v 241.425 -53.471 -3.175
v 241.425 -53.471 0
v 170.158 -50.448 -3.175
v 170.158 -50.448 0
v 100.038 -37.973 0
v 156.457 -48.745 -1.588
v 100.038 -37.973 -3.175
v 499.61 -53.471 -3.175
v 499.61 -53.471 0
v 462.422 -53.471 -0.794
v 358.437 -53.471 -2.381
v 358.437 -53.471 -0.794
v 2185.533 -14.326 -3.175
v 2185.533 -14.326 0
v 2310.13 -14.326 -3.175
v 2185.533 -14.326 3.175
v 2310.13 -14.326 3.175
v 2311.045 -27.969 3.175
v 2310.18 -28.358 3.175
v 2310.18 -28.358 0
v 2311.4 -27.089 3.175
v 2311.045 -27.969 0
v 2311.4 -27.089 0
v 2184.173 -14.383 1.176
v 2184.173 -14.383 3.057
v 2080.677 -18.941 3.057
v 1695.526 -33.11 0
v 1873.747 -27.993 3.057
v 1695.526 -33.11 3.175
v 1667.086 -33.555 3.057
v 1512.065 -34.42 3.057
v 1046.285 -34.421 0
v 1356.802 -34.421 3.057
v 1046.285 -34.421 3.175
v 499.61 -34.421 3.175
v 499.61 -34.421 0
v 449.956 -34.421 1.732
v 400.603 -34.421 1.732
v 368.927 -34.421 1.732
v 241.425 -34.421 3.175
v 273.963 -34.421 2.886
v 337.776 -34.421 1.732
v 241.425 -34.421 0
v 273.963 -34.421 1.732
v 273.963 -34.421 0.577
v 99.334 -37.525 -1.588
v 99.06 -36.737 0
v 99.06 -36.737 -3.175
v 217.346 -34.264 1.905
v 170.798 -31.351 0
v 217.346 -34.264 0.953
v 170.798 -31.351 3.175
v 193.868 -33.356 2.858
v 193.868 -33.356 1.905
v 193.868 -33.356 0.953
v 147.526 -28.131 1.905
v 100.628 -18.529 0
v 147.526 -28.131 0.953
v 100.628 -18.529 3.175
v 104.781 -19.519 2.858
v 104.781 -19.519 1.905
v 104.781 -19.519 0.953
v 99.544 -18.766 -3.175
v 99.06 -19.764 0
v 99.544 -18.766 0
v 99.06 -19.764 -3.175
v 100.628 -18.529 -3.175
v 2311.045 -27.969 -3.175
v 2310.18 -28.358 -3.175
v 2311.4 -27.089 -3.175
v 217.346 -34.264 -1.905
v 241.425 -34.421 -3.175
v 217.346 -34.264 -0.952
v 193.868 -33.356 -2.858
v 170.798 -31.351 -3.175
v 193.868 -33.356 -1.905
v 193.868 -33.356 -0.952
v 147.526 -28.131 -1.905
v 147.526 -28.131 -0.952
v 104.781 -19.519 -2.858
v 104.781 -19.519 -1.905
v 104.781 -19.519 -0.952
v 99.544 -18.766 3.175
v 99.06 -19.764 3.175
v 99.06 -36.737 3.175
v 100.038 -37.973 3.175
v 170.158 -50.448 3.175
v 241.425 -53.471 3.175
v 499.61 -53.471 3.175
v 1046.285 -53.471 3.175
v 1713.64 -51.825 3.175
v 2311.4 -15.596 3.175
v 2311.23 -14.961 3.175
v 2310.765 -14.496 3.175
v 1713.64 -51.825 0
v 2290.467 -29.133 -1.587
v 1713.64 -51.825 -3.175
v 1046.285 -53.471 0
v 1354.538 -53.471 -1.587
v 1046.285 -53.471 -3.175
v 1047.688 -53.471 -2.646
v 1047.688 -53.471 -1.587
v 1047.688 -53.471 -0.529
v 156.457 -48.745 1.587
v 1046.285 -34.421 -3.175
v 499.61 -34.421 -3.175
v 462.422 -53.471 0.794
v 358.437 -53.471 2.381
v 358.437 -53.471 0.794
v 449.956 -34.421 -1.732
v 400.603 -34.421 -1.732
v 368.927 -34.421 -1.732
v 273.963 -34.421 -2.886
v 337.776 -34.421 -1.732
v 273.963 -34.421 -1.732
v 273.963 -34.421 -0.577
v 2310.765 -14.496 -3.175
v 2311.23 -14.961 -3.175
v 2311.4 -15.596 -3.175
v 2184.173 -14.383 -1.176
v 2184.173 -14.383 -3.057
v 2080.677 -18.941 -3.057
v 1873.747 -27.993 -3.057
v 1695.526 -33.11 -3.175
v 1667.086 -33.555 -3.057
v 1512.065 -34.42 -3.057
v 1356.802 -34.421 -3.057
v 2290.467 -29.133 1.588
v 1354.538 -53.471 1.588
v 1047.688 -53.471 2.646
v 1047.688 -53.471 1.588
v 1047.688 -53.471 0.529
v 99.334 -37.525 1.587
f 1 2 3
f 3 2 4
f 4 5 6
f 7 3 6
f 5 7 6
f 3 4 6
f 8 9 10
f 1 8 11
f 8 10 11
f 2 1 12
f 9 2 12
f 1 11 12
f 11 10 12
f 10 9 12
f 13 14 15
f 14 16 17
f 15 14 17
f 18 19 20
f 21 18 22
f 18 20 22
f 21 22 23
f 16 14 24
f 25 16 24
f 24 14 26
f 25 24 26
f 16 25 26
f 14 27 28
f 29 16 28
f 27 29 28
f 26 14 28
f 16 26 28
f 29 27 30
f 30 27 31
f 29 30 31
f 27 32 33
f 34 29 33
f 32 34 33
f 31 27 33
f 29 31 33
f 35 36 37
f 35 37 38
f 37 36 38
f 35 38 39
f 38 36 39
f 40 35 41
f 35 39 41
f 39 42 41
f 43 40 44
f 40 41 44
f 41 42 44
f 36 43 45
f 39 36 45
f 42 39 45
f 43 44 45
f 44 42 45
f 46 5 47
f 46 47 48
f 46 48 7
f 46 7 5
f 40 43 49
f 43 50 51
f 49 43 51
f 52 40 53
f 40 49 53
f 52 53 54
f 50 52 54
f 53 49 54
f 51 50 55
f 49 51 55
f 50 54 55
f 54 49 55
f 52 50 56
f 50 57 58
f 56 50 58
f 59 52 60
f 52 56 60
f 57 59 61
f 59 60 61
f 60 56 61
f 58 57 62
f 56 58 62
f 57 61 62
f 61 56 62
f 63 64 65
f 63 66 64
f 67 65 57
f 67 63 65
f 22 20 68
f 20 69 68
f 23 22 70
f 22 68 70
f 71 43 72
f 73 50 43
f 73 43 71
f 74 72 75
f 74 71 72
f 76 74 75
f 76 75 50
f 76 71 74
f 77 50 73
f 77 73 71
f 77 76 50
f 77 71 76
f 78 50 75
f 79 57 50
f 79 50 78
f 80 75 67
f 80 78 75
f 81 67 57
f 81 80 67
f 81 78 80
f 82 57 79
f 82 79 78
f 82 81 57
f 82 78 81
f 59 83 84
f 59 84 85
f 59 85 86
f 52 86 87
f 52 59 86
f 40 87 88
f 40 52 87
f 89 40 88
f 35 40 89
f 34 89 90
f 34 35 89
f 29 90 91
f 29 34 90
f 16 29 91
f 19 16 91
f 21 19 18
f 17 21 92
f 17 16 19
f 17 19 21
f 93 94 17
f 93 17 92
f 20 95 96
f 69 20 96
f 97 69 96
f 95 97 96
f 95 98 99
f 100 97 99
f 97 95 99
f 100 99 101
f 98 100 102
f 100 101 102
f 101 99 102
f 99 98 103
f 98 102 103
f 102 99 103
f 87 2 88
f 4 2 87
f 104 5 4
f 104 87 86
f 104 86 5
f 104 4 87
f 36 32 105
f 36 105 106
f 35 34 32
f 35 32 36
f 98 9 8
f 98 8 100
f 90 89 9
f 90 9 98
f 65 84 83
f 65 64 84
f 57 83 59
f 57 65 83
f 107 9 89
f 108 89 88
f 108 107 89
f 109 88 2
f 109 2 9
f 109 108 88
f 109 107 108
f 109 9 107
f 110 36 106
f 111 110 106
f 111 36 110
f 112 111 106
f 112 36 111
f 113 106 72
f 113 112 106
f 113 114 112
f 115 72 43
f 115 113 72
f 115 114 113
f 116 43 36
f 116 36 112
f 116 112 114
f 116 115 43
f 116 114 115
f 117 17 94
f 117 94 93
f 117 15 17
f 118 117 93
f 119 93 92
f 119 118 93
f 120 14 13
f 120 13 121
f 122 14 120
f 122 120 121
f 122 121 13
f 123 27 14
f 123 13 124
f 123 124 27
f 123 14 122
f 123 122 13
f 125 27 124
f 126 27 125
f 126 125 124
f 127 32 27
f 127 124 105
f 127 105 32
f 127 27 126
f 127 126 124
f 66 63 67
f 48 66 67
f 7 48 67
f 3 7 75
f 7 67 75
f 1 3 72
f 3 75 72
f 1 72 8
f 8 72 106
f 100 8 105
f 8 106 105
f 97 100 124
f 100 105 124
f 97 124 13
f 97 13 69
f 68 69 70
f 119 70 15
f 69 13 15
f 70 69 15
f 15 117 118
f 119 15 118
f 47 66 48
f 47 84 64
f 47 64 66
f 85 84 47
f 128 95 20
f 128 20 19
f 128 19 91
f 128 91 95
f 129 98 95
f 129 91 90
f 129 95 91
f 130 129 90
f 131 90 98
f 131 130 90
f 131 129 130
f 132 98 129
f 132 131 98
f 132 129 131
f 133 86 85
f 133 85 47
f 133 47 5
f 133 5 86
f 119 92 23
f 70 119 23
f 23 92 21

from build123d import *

# Parameters (mm, degrees)
BOSS_EXTRUDE1_DEPTH = 3.175
CUT_EXTRUDE1_DEPTH  = 7.3500001
FILLET1_R           = 1.27


with BuildPart() as part:
    # Sketch1 → Boss-Extrude1 (new body, symmetric)
    with BuildSketch(Plane.XY):
        with BuildLine():
            Line((499.61002795, -53.470702797), (1046.28548189, -53.470702797))
            add(Edge.make_bspline(
                [(2669.54, -9.569049356), (2615.393603553, -13.17073937), (2561.080658619, -16.536108081), (2506.205230446, -19.758621957), (2430.209106802, -23.505211705), (2354.212983157, -26.631486423), (2332.570330468, -27.480988169), (2156.268639429, -34.377768543), (1979.966947376, -41.628631248), (1824.114277635, -52.771265877), (1636.928606778, -53.579569849), (1449.742935921, -53.454024613), (1418.006730935, -53.470702797), (1324.899336146, -53.470702797), (1231.791940344, -53.470702797), (1170.441269319, -53.470702797), (1108.784075813, -53.470702797), (1047.126882346, -53.470702797), (1046.846414188, -53.470702797), (1046.565947184, -53.470702797), (1046.28548189, -53.470702797)],
                knots=[103.698913506, 103.698913506, 103.698913506, 103.698913506, 103.698913506, 103.698913506, 130.927896619, 130.927896619, 130.927896619, 141.337054719, 141.337054719, 141.337054719, 218.101815019, 218.101815019, 218.101815019, 233.772059419, 233.772059419, 233.772059419, 264.077723219, 264.077723219, 264.077723219, 264.2162088, 264.2162088, 264.2162088, 264.2162088, 264.2162088, 264.2162088], degree=5))
            Line((2669.54, -9.569049356), (2669.54, 9.5231025))
            add(Edge.make_bspline(
                [(2669.54, 9.5231025), (2667.126494524, 9.36235515), (2659.861586685, 8.880281494), (2635.666282302, 7.292469146), (2596.857665529, 4.826056853), (2545.729743039, 1.758344093), (2494.405305707, -1.098555235), (2451.533022267, -3.266573297), (2417.198316756, -4.86708361), (2391.457076919, -6.003589235), (2365.634736307, -7.086854581), (2339.546284672, -8.137729944), (2313.466132974, -9.165138371), (2287.612375486, -10.179478215), (2261.763347437, -11.201032297), (2227.285329715, -12.583842557), (2184.175569393, -14.36607236), (2132.429066114, -16.607427868), (2063.4255234, -19.708920485), (1977.174907635, -23.700543313), (1873.732451432, -28.149389221), (1770.37461881, -31.657468649), (1667.085687813, -33.793117556), (1581.011094491, -34.383188831), (1512.07397126, -34.4278026), (1443.061513477, -34.409510402), (1356.800927879, -34.424432812), (1218.794626954, -34.418464788), (1115.289022786, -34.420702797), (1046.28548189, -34.420702797)],
                knots=[103.571582669, 103.571582669, 103.571582669, 103.571582669, 104.300777207, 105.766098403, 110.877392287, 115.98868617, 121.099980054, 126.211273938, 128.76692088, 131.322567822, 133.878214764, 136.433861706, 138.989508647, 141.545155589, 144.100802531, 146.656449473, 151.767743357, 156.879037241, 161.990331124, 172.212918892, 182.43550666, 192.658094427, 202.880682195, 213.103269962, 218.214563846, 223.32585773, 233.548445497, 243.771033265, 264.2162088, 264.2162088, 264.2162088, 264.2162088], degree=3))
            Line((1046.28548189, -34.420702797), (499.61002795, -34.420702797))
            add(Edge.make_bspline(
                [(499.61002795, -34.420702797), (488.614737518, -34.420702797), (472.236395365, -34.420702798), (449.940231846, -34.420702794), (427.771305695, -34.42070281), (405.874681663, -34.420702712), (384.584909128, -34.420702942), (368.900229326, -34.420702244), (353.376568613, -34.420704862), (332.608466435, -34.420689186), (306.287754853, -34.420570006), (274.023487704, -34.420538256), (252.271015965, -34.420709741), (241.425150134, -34.420702761)],
                knots=[19.90682951, 19.90682951, 19.90682951, 19.90682951, 23.220120017, 24.876765271, 26.533410525, 29.846701033, 31.503346286, 33.15999154, 34.816636794, 36.473282048, 39.786572556, 43.099863063, 46.413153571, 46.413153571, 46.413153571, 46.413153571], degree=3))
            add(Edge.make_bspline(
                [(241.425150134, -34.420702761), (239.394928853, -34.420701455), (235.322322927, -34.420495867), (227.274423443, -34.398702533), (217.319360062, -34.297466855), (205.530690077, -33.976385563), (189.963341914, -33.212641271), (170.696984653, -31.543495194), (147.533261232, -28.314398128), (125.482753206, -24.202109872), (109.358914834, -20.622537553), (100.964116069, -18.612521054), (99.06, -18.149327722)],
                knots=[0, 0, 0, 0, 0.622088422, 1.244176844, 2.488353689, 3.732530533, 4.976707377, 7.465061066, 9.953414755, 12.441768444, 14.55823542, 15.180323842, 15.180323842, 15.180323842, 15.180323842], degree=3))
            Line((99.06, -18.149327722), (99.06, -37.741485304))
            add(Edge.make_bspline(
                [(241.425137875, -53.470702761), (224.286916993, -53.470691732), (207.149474967, -53.467315374), (190.203897513, -52.686577078), (161.734965878, -49.987457476), (133.266034188, -45.175583375), (121.749620566, -42.910592695), (110.349390726, -40.420274627), (99.06, -37.741485304)],
                knots=[0, 0, 0, 0, 0, 0, 8.71381608, 8.71381608, 8.71381608, 14.701907176, 14.701907176, 14.701907176, 14.701907176, 14.701907176, 14.701907176], degree=5))
            add(Edge.make_bspline(
                [(499.61002795, -53.470702797), (492.136820835, -53.470702797), (484.754348064, -53.470702797), (477.443025859, -53.470702797), (448.516583145, -53.470702797), (419.590140517, -53.470702797), (398.368118521, -53.470702797), (355.647540186, -53.470702797), (312.926961851, -53.470702797), (289.235090436, -53.470293029), (265.364963651, -53.470705034), (241.4948369, -53.470702789), (241.471603891, -53.470702785), (241.448370882, -53.470702776), (241.425137875, -53.470702761)],
                knots=[19.90682951, 19.90682951, 19.90682951, 19.90682951, 19.90682951, 19.90682951, 23.637897311, 23.637897311, 23.637897311, 34.276545571, 34.276545571, 34.276545571, 46.401340901, 46.401340901, 46.401340901, 46.413153571, 46.413153571, 46.413153571, 46.413153571, 46.413153571, 46.413153571], degree=5))
        make_face()
    extrude(amount=BOSS_EXTRUDE1_DEPTH, both=True)

    # Sketch2 → Cut-Extrude1 (cut, through all)
    with BuildSketch(Plane.XY.offset(3.175)):
        with BuildLine():
            add(Edge.make_bspline(
                [(2311.4, -9.245659725), (2303.45127581, -9.558066869), (2286.914031668, -10.207076776), (2261.763347437, -11.201032297), (2227.738431725, -12.565669989), (2202.325932618, -13.615715702), (2185.532985525, -14.325659725)],
                knots=[139.196640642, 139.196640642, 139.196640642, 139.196640642, 141.545155589, 144.100802531, 146.656449473, 151.63340051, 151.63340051, 151.63340051, 151.63340051], degree=3))
            Line((2185.532985525, -14.325659725), (2311.4, -14.325659725))
            Line((2311.4, -14.325659725), (2311.4, -9.245659725))
        make_face()
        with BuildLine():
            Line((2311.4, -9.245659725), (2311.4, -14.325659725))
            Line((2311.4, -14.325659725), (2311.4, -28.310356345))
            add(Edge.make_bspline(
                [(2669.54, -9.569049356), (2615.393603553, -13.17073937), (2561.080658619, -16.536108081), (2506.205230446, -19.758621957), (2434.382223772, -23.29947809), (2362.559217098, -26.286274493), (2345.393069943, -26.972929947), (2328.342945407, -27.644579597), (2311.4, -28.310356345)],
                knots=[103.698913506, 103.698913506, 103.698913506, 103.698913506, 103.698913506, 103.698913506, 130.927896619, 130.927896619, 130.927896619, 139.270260279, 139.270260279, 139.270260279, 139.270260279, 139.270260279, 139.270260279], degree=5))
            Line((2669.54, -9.569049356), (2669.54, 9.5231025))
            add(Edge.make_bspline(
                [(2669.54, 9.5231025), (2667.126494524, 9.36235515), (2659.861586685, 8.880281494), (2635.666282302, 7.292469146), (2596.857665529, 4.826056853), (2545.729743039, 1.758344093), (2494.405305707, -1.098555235), (2451.533022267, -3.266573297), (2417.198316756, -4.86708361), (2391.457076919, -6.003589235), (2365.634736307, -7.086854581), (2339.546284672, -8.137729944), (2321.454928961, -8.850425619), (2312.1010537, -9.218106349), (2311.4, -9.245659725)],
                knots=[103.571582669, 103.571582669, 103.571582669, 103.571582669, 104.300777207, 105.766098403, 110.877392287, 115.98868617, 121.099980054, 126.211273938, 128.76692088, 131.322567822, 133.878214764, 136.433861706, 138.989508647, 139.196640642, 139.196640642, 139.196640642, 139.196640642], degree=3))
        make_face()
    extrude(amount=-CUT_EXTRUDE1_DEPTH, mode=Mode.SUBTRACT)

    # Fillet1
    fillet1_edges = [part.edges().sort_by_distance(p)[0] for p in [
        (99.06, -37.741485304, -1.5875),
        (99.06, -18.149327722, -1.5875),
        (2311.4, -14.325659725, 0),
        (2311.4, -28.310356345, -1.5875),
    ]]
    fillet(fillet1_edges, radius=FILLET1_R)


solid = part.part
